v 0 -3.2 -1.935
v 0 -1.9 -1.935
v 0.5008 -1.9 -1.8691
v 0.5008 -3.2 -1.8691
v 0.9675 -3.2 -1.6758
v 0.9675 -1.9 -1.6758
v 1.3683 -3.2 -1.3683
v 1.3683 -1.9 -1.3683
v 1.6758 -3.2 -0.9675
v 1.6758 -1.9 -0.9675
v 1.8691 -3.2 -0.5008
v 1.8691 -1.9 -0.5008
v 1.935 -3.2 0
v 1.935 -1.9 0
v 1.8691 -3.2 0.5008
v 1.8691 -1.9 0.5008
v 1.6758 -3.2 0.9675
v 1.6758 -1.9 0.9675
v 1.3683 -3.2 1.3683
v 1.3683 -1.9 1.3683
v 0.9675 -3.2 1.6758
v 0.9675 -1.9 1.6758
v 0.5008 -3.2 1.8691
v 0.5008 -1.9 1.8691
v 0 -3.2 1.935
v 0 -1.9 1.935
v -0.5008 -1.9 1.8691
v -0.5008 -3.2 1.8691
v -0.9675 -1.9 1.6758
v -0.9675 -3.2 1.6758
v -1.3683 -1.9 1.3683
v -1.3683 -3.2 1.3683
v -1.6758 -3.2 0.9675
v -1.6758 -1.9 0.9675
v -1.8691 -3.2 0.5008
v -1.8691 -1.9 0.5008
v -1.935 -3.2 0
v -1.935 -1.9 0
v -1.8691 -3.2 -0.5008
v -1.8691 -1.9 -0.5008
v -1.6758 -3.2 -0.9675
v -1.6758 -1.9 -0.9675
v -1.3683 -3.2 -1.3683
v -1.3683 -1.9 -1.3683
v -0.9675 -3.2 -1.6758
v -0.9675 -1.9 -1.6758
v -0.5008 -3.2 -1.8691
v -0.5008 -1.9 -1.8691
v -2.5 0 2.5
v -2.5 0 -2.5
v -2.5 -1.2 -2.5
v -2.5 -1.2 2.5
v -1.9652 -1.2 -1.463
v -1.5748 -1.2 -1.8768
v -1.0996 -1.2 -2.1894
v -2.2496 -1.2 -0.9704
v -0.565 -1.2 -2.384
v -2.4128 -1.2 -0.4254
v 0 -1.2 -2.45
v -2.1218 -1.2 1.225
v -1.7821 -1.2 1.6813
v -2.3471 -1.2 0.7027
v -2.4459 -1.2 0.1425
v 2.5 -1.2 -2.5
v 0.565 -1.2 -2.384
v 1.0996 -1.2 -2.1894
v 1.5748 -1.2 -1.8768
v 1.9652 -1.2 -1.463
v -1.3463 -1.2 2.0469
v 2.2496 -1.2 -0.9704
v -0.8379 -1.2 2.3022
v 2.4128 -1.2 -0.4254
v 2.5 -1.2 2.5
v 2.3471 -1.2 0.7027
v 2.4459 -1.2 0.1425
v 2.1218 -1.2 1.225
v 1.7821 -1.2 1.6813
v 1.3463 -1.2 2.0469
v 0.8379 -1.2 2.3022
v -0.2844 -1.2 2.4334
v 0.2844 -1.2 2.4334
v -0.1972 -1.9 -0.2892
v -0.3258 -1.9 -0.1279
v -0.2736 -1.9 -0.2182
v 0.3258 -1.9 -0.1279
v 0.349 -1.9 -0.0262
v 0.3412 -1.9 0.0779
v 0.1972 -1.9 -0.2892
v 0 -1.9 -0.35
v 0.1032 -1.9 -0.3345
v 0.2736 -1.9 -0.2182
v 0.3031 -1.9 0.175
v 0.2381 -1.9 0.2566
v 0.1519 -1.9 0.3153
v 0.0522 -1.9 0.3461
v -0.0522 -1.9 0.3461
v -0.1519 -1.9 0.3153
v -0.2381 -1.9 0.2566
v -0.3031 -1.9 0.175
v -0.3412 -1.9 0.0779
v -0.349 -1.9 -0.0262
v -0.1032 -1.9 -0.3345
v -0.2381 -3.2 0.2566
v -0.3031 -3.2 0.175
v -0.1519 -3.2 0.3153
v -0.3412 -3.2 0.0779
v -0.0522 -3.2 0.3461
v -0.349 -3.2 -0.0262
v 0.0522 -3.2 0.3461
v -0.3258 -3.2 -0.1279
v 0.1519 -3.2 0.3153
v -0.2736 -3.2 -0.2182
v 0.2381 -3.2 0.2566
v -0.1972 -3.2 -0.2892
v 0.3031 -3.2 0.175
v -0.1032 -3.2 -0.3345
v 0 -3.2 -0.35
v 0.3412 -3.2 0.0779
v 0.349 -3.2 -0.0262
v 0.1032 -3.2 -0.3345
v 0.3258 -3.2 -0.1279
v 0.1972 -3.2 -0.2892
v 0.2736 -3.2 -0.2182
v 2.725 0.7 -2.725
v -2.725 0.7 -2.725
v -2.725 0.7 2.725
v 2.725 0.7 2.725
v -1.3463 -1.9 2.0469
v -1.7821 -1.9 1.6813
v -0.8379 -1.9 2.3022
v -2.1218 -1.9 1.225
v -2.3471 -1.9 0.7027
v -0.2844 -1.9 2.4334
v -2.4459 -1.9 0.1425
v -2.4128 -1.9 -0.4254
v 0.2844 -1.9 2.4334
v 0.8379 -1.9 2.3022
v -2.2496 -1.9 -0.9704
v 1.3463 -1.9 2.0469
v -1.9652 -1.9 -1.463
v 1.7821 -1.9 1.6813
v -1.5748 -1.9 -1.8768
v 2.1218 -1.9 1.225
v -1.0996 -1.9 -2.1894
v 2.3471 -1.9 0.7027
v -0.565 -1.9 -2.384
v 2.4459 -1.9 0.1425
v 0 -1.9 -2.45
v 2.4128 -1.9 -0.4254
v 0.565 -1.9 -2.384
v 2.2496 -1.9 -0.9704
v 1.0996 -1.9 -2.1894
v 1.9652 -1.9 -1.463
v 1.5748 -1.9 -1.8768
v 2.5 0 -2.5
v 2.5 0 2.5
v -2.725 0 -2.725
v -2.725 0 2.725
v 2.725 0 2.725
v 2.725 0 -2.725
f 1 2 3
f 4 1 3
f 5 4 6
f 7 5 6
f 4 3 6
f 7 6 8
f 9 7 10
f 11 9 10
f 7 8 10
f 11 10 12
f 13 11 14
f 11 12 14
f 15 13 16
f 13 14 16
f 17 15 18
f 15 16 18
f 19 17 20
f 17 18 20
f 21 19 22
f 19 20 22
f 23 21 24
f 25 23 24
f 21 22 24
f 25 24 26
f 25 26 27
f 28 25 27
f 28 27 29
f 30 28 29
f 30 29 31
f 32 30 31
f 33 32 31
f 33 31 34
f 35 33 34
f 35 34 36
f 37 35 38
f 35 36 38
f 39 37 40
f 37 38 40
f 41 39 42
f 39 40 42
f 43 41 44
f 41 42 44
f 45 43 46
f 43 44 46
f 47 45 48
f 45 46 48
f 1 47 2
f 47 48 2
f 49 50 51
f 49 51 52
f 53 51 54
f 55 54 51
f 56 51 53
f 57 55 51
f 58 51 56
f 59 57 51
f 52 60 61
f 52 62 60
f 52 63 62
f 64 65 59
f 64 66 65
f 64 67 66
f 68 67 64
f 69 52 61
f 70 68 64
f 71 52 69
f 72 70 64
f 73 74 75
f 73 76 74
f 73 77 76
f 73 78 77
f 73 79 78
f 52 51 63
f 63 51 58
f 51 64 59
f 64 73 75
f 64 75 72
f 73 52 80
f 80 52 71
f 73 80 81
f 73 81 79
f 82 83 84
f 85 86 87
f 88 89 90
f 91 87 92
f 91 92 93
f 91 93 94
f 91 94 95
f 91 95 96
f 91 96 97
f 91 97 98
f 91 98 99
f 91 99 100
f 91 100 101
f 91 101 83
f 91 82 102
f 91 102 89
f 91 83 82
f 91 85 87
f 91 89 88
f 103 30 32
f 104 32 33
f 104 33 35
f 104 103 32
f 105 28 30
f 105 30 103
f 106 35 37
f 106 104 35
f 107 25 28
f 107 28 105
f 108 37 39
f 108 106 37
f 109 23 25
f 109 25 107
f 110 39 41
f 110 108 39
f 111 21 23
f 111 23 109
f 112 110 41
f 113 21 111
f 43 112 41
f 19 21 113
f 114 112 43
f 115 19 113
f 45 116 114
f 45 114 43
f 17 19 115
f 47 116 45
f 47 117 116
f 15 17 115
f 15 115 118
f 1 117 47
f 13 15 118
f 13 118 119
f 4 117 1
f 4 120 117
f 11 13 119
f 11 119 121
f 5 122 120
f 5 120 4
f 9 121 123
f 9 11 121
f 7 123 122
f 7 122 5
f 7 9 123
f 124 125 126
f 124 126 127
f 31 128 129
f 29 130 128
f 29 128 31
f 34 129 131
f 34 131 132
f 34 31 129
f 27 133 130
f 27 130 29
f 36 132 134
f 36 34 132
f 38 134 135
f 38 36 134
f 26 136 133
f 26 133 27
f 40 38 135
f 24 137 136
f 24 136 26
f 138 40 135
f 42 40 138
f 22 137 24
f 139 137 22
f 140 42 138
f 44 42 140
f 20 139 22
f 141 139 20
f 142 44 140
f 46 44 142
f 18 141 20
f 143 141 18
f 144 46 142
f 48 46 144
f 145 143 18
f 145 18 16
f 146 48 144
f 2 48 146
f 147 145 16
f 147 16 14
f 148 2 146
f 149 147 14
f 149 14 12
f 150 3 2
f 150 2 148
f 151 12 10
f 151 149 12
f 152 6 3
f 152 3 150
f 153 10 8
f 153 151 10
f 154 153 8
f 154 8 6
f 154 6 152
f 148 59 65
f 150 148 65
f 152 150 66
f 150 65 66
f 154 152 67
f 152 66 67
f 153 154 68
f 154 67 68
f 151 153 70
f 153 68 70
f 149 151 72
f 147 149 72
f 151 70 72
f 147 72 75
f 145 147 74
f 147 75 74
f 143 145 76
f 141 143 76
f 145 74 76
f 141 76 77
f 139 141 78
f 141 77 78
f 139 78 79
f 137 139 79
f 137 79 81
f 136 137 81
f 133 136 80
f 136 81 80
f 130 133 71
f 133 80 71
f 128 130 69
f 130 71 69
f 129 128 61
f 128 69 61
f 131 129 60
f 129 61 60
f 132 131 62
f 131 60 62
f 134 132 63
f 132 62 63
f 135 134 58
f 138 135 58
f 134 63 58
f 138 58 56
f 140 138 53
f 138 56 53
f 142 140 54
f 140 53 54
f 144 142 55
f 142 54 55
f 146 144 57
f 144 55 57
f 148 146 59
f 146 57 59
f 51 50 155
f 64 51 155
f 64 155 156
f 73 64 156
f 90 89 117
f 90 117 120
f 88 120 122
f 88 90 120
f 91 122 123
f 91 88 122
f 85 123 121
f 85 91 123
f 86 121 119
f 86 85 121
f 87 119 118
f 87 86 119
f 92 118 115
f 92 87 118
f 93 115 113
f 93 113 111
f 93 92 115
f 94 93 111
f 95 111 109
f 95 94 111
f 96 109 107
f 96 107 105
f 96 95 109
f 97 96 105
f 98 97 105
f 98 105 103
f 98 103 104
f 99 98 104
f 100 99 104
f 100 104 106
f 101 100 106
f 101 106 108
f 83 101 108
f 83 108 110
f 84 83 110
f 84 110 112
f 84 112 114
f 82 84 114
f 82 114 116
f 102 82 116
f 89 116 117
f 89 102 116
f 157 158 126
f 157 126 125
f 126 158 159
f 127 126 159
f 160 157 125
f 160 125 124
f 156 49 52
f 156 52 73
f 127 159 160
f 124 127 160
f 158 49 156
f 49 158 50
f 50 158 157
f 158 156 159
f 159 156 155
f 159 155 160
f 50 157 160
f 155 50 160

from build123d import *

# Parameters (mm, degrees)
SKETCH1_W           = 5.45
SKETCH1_H           = 5.45
BOSS_EXTRUDE1_DEPTH = 0.7
SKETCH2_W           = 5
SKETCH2_H           = 5
BOSS_EXTRUDE2_DEPTH = 1.2
SKETCH4_R           = 2.45
BOSS_EXTRUDE3_DEPTH = 0.7
SKETCH5_R           = 1.935
SKETCH5_R_2         = 0.35
BOSS_EXTRUDE4_DEPTH = 1.3


with BuildPart() as part:
    # Sketch1 → Boss-Extrude1 (new body)
    with BuildSketch(Plane(origin=(0, 0, 0), x_dir=(1, 0, 0), z_dir=(0, 1, 0))):
        Rectangle(SKETCH1_W, SKETCH1_H)
    extrude(amount=BOSS_EXTRUDE1_DEPTH)

    # Sketch2 → Boss-Extrude2 (add)
    with BuildSketch(Plane.XZ):
        Rectangle(SKETCH2_W, SKETCH2_H)
    extrude(amount=BOSS_EXTRUDE2_DEPTH)

    # Sketch4 → Boss-Extrude3 (add)
    with BuildSketch(Plane.XZ.offset(1.2)):
        with Locations(Location((0, 0, 0), (0, 0, 270))):
            Circle(SKETCH4_R)
    extrude(amount=BOSS_EXTRUDE3_DEPTH)

    # Sketch5 → Boss-Extrude4 (add)
    with BuildSketch(Plane.XZ.offset(1.9)):
        with Locations(Location((0, 0, 0), (0, 0, 270))):
            Circle(SKETCH5_R)
        with Locations(Location((0, 0, 0), (0, 0, 270))):
            Circle(SKETCH5_R_2, mode=Mode.SUBTRACT)
    extrude(amount=BOSS_EXTRUDE4_DEPTH)


solid = part.part
